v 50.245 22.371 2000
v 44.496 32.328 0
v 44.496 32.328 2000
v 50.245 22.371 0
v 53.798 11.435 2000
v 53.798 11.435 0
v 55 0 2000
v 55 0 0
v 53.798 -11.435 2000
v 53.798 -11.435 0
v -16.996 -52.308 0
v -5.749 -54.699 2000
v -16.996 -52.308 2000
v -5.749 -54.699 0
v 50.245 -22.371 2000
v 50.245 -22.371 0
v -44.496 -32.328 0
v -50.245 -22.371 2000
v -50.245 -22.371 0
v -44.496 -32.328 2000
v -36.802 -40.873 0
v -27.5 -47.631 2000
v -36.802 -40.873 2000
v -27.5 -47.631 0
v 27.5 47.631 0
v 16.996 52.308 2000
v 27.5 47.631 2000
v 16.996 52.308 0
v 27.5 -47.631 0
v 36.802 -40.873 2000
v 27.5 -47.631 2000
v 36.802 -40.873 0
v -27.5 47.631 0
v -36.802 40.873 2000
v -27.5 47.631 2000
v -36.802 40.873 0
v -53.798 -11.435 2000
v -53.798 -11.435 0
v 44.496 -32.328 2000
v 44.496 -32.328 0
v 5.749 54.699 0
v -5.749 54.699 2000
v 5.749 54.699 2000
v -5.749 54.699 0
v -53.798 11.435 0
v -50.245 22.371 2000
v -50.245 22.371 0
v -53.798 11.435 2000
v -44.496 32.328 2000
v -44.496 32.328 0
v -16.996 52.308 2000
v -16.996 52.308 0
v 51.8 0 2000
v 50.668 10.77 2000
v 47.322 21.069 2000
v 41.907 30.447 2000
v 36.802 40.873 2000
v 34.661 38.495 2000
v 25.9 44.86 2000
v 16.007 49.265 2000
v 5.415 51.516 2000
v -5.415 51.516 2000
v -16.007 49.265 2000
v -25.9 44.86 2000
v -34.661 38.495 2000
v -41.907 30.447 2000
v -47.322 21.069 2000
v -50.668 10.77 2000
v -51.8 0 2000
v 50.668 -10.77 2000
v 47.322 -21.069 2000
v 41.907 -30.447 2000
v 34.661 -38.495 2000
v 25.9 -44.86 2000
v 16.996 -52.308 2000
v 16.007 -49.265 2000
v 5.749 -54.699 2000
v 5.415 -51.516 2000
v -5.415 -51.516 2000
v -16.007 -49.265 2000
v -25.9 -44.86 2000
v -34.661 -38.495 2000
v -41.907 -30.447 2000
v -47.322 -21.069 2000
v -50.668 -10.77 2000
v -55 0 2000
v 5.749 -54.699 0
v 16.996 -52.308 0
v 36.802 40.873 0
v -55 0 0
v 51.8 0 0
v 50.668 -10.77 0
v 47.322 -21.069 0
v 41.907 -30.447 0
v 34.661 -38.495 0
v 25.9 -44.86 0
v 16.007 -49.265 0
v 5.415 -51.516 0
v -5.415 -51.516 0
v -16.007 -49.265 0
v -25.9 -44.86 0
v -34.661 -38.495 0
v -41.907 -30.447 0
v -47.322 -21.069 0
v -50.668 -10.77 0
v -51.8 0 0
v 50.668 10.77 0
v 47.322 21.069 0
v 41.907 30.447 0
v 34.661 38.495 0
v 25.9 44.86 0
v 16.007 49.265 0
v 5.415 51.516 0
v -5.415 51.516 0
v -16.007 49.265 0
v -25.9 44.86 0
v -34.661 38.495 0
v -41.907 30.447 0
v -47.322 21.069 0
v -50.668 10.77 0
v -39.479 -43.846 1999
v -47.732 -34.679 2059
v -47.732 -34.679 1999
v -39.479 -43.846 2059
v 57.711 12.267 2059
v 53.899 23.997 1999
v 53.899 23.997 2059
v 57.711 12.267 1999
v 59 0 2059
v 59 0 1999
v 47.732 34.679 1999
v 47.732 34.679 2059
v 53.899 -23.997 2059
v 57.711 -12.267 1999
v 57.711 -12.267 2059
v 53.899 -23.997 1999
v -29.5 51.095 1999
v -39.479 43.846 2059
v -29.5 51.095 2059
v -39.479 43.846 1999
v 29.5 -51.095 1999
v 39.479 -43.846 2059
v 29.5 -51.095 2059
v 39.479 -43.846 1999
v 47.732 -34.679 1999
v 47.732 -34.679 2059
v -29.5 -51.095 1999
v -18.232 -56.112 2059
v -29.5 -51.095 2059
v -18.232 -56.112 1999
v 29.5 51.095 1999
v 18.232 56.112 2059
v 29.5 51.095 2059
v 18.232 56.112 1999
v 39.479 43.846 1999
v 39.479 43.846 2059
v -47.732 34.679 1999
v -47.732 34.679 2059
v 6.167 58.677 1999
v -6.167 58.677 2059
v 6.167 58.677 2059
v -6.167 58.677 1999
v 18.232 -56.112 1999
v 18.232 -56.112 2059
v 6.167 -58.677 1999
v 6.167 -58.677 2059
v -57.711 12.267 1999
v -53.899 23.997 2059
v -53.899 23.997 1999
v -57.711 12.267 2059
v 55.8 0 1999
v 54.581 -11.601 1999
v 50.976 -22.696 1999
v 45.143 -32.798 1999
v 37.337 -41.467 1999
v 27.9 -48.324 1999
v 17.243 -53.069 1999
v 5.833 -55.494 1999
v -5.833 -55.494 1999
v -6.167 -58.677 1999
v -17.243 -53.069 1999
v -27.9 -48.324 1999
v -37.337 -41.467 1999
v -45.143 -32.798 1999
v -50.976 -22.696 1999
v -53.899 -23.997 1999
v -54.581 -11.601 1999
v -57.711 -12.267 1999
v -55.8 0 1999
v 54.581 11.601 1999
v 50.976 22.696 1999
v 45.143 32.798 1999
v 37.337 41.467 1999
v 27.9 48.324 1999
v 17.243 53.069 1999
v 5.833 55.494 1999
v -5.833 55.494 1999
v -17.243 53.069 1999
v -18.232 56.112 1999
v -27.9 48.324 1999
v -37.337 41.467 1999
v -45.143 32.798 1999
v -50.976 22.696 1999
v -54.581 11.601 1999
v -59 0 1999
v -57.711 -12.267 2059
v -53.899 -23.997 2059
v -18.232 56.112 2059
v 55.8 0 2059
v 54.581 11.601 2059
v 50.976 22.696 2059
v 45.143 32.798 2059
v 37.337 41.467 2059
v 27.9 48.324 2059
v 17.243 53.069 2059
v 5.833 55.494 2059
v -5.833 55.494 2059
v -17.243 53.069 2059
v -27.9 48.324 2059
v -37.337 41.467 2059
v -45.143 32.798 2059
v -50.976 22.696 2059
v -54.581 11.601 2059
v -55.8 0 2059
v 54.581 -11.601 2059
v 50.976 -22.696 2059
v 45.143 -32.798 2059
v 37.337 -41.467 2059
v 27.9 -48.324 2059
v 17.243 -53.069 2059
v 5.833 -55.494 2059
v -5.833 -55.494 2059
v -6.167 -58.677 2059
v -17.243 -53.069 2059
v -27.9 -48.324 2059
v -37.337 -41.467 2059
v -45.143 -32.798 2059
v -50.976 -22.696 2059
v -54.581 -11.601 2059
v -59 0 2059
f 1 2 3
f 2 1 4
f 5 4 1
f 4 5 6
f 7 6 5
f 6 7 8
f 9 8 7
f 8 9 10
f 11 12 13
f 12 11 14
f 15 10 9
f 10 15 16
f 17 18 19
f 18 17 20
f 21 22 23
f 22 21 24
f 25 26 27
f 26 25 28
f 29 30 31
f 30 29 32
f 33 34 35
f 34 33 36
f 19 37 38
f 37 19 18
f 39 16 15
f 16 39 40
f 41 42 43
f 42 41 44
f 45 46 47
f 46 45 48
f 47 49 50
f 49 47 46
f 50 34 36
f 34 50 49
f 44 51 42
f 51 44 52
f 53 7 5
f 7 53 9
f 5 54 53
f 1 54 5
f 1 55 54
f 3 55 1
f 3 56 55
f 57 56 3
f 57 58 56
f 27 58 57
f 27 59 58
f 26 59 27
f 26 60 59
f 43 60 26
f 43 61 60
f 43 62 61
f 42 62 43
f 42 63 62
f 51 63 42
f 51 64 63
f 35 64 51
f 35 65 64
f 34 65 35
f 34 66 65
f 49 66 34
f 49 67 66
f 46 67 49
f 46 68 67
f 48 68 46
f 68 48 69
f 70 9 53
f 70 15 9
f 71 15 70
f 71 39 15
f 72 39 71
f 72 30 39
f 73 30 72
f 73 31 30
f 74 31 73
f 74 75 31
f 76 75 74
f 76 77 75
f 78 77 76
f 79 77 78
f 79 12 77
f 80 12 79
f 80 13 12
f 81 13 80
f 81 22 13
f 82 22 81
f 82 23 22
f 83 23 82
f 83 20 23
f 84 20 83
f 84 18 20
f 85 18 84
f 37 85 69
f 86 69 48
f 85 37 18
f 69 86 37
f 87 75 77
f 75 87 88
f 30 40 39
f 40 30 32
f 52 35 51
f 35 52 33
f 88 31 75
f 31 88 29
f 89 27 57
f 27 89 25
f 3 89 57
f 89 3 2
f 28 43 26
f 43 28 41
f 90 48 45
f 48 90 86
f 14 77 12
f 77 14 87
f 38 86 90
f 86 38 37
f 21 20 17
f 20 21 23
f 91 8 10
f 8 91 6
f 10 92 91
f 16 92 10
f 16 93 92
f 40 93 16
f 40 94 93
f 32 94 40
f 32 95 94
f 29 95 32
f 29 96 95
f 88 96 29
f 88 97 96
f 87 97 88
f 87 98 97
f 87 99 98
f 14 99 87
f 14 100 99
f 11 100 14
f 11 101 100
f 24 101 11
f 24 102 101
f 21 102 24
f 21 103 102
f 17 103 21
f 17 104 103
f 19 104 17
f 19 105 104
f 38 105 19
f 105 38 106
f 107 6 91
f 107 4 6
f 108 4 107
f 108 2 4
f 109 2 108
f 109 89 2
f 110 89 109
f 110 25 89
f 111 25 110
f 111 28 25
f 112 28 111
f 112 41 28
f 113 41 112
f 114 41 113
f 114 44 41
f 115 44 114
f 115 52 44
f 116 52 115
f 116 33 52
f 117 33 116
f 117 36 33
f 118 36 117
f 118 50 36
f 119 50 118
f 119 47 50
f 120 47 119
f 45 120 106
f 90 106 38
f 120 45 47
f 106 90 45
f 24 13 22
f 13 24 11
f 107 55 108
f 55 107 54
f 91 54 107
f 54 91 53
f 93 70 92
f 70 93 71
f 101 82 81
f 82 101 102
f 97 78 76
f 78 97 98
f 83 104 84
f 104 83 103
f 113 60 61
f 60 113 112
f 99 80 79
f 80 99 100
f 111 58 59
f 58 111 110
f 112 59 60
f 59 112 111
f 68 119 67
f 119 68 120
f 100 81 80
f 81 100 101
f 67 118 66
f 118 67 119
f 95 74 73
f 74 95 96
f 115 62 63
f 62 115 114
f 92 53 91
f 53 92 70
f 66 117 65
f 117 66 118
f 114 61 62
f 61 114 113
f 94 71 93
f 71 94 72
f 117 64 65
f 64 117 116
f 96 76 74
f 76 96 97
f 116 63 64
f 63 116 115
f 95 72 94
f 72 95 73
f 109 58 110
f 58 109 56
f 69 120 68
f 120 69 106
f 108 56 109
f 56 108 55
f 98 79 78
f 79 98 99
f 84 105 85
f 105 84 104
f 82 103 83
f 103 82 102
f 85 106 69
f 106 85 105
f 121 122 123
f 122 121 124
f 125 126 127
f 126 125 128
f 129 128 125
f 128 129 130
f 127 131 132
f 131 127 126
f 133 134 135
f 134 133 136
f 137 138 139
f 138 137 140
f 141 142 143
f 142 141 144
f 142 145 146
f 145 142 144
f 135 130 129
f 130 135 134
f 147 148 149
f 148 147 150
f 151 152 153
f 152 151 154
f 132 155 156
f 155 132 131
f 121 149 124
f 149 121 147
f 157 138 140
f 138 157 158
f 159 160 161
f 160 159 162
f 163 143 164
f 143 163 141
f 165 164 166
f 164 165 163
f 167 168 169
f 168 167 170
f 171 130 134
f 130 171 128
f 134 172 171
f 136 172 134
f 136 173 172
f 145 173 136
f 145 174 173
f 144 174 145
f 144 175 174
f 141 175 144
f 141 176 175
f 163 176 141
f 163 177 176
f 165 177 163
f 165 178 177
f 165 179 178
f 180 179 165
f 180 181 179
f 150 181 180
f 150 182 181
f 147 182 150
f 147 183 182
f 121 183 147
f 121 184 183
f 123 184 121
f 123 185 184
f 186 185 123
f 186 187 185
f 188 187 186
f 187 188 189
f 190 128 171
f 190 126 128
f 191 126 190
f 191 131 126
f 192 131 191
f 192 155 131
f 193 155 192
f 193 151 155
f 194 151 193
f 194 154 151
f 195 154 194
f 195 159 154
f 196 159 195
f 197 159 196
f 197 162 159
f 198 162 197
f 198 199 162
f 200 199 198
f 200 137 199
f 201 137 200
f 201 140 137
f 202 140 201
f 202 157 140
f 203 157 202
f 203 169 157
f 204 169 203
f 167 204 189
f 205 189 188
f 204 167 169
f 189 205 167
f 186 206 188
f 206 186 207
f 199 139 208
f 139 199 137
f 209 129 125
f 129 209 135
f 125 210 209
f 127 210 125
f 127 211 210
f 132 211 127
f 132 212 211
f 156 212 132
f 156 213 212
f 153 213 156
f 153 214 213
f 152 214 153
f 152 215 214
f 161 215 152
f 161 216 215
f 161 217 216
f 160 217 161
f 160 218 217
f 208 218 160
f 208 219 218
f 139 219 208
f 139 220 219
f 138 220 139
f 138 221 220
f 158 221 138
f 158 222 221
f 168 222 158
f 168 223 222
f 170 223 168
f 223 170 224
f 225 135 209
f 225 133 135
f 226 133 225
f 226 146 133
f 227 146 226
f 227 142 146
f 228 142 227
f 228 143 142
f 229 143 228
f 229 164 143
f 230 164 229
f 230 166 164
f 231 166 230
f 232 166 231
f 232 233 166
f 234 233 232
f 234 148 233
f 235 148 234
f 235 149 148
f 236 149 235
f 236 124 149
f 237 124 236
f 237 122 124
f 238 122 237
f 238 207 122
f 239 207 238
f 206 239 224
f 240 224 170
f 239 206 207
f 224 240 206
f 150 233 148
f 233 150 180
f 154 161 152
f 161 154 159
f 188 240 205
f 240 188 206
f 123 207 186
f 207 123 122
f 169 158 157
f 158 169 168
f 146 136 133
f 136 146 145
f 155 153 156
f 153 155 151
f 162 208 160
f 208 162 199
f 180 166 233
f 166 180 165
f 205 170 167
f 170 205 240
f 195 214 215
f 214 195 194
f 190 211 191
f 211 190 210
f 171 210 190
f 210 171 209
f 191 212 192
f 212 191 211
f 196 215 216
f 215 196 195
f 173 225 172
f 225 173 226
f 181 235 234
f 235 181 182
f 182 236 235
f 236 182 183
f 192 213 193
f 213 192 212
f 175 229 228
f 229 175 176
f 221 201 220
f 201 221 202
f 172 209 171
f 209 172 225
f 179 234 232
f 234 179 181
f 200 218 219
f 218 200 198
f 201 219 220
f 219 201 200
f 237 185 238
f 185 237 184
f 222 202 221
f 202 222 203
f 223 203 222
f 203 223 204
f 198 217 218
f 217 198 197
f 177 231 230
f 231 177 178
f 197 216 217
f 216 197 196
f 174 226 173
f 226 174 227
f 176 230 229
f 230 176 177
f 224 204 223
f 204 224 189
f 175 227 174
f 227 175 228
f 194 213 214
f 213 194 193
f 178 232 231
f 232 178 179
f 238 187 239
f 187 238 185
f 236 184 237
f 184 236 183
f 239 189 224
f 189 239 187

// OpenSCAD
// Parameters
pipe_standard = 1; //[1:1:1]
nominal_diameter_mm = 110; //[55:220:1]
length_mm = 2000; //[1000:4000:10]
wall_thickness_mm = 3.2; //[1.6:6.4:0.1]
fitting_length_mm = 60; //[30:120:1]
fitting_radial_thickness_mm = 4; //[2:10:0.5]
fitting_inner_clearance_mm = 0.8; //[0.2:2:0.1]
overlap_mm = 1; //[0.5:2:0.1]

// HT Pipe - complete geometry
module ht_pipe() {
  color([0.85, 0.85, 0.8]) { // PVC color
    // Pipe body
    difference() {
      cylinder(h=length_mm, r=nominal_diameter_mm/2, center=false);
      translate([0, 0, 0])
        cylinder(h=length_mm, r=nominal_diameter_mm/2 - wall_thickness_mm, center=false);
    }
    
    // Integrated end fitting
    translate([0, 0, length_mm - overlap_mm]) {
      difference() {
        cylinder(h=fitting_length_mm, r=nominal_diameter_mm/2 + fitting_radial_thickness_mm, center=false);
        translate([0, 0, 0])
          cylinder(h=fitting_length_mm, r=nominal_diameter_mm/2 + fitting_inner_clearance_mm, center=false);
      }
    }
  }
}

// Assembly
module assembly() {
  ht_pipe();
}

assembly();
